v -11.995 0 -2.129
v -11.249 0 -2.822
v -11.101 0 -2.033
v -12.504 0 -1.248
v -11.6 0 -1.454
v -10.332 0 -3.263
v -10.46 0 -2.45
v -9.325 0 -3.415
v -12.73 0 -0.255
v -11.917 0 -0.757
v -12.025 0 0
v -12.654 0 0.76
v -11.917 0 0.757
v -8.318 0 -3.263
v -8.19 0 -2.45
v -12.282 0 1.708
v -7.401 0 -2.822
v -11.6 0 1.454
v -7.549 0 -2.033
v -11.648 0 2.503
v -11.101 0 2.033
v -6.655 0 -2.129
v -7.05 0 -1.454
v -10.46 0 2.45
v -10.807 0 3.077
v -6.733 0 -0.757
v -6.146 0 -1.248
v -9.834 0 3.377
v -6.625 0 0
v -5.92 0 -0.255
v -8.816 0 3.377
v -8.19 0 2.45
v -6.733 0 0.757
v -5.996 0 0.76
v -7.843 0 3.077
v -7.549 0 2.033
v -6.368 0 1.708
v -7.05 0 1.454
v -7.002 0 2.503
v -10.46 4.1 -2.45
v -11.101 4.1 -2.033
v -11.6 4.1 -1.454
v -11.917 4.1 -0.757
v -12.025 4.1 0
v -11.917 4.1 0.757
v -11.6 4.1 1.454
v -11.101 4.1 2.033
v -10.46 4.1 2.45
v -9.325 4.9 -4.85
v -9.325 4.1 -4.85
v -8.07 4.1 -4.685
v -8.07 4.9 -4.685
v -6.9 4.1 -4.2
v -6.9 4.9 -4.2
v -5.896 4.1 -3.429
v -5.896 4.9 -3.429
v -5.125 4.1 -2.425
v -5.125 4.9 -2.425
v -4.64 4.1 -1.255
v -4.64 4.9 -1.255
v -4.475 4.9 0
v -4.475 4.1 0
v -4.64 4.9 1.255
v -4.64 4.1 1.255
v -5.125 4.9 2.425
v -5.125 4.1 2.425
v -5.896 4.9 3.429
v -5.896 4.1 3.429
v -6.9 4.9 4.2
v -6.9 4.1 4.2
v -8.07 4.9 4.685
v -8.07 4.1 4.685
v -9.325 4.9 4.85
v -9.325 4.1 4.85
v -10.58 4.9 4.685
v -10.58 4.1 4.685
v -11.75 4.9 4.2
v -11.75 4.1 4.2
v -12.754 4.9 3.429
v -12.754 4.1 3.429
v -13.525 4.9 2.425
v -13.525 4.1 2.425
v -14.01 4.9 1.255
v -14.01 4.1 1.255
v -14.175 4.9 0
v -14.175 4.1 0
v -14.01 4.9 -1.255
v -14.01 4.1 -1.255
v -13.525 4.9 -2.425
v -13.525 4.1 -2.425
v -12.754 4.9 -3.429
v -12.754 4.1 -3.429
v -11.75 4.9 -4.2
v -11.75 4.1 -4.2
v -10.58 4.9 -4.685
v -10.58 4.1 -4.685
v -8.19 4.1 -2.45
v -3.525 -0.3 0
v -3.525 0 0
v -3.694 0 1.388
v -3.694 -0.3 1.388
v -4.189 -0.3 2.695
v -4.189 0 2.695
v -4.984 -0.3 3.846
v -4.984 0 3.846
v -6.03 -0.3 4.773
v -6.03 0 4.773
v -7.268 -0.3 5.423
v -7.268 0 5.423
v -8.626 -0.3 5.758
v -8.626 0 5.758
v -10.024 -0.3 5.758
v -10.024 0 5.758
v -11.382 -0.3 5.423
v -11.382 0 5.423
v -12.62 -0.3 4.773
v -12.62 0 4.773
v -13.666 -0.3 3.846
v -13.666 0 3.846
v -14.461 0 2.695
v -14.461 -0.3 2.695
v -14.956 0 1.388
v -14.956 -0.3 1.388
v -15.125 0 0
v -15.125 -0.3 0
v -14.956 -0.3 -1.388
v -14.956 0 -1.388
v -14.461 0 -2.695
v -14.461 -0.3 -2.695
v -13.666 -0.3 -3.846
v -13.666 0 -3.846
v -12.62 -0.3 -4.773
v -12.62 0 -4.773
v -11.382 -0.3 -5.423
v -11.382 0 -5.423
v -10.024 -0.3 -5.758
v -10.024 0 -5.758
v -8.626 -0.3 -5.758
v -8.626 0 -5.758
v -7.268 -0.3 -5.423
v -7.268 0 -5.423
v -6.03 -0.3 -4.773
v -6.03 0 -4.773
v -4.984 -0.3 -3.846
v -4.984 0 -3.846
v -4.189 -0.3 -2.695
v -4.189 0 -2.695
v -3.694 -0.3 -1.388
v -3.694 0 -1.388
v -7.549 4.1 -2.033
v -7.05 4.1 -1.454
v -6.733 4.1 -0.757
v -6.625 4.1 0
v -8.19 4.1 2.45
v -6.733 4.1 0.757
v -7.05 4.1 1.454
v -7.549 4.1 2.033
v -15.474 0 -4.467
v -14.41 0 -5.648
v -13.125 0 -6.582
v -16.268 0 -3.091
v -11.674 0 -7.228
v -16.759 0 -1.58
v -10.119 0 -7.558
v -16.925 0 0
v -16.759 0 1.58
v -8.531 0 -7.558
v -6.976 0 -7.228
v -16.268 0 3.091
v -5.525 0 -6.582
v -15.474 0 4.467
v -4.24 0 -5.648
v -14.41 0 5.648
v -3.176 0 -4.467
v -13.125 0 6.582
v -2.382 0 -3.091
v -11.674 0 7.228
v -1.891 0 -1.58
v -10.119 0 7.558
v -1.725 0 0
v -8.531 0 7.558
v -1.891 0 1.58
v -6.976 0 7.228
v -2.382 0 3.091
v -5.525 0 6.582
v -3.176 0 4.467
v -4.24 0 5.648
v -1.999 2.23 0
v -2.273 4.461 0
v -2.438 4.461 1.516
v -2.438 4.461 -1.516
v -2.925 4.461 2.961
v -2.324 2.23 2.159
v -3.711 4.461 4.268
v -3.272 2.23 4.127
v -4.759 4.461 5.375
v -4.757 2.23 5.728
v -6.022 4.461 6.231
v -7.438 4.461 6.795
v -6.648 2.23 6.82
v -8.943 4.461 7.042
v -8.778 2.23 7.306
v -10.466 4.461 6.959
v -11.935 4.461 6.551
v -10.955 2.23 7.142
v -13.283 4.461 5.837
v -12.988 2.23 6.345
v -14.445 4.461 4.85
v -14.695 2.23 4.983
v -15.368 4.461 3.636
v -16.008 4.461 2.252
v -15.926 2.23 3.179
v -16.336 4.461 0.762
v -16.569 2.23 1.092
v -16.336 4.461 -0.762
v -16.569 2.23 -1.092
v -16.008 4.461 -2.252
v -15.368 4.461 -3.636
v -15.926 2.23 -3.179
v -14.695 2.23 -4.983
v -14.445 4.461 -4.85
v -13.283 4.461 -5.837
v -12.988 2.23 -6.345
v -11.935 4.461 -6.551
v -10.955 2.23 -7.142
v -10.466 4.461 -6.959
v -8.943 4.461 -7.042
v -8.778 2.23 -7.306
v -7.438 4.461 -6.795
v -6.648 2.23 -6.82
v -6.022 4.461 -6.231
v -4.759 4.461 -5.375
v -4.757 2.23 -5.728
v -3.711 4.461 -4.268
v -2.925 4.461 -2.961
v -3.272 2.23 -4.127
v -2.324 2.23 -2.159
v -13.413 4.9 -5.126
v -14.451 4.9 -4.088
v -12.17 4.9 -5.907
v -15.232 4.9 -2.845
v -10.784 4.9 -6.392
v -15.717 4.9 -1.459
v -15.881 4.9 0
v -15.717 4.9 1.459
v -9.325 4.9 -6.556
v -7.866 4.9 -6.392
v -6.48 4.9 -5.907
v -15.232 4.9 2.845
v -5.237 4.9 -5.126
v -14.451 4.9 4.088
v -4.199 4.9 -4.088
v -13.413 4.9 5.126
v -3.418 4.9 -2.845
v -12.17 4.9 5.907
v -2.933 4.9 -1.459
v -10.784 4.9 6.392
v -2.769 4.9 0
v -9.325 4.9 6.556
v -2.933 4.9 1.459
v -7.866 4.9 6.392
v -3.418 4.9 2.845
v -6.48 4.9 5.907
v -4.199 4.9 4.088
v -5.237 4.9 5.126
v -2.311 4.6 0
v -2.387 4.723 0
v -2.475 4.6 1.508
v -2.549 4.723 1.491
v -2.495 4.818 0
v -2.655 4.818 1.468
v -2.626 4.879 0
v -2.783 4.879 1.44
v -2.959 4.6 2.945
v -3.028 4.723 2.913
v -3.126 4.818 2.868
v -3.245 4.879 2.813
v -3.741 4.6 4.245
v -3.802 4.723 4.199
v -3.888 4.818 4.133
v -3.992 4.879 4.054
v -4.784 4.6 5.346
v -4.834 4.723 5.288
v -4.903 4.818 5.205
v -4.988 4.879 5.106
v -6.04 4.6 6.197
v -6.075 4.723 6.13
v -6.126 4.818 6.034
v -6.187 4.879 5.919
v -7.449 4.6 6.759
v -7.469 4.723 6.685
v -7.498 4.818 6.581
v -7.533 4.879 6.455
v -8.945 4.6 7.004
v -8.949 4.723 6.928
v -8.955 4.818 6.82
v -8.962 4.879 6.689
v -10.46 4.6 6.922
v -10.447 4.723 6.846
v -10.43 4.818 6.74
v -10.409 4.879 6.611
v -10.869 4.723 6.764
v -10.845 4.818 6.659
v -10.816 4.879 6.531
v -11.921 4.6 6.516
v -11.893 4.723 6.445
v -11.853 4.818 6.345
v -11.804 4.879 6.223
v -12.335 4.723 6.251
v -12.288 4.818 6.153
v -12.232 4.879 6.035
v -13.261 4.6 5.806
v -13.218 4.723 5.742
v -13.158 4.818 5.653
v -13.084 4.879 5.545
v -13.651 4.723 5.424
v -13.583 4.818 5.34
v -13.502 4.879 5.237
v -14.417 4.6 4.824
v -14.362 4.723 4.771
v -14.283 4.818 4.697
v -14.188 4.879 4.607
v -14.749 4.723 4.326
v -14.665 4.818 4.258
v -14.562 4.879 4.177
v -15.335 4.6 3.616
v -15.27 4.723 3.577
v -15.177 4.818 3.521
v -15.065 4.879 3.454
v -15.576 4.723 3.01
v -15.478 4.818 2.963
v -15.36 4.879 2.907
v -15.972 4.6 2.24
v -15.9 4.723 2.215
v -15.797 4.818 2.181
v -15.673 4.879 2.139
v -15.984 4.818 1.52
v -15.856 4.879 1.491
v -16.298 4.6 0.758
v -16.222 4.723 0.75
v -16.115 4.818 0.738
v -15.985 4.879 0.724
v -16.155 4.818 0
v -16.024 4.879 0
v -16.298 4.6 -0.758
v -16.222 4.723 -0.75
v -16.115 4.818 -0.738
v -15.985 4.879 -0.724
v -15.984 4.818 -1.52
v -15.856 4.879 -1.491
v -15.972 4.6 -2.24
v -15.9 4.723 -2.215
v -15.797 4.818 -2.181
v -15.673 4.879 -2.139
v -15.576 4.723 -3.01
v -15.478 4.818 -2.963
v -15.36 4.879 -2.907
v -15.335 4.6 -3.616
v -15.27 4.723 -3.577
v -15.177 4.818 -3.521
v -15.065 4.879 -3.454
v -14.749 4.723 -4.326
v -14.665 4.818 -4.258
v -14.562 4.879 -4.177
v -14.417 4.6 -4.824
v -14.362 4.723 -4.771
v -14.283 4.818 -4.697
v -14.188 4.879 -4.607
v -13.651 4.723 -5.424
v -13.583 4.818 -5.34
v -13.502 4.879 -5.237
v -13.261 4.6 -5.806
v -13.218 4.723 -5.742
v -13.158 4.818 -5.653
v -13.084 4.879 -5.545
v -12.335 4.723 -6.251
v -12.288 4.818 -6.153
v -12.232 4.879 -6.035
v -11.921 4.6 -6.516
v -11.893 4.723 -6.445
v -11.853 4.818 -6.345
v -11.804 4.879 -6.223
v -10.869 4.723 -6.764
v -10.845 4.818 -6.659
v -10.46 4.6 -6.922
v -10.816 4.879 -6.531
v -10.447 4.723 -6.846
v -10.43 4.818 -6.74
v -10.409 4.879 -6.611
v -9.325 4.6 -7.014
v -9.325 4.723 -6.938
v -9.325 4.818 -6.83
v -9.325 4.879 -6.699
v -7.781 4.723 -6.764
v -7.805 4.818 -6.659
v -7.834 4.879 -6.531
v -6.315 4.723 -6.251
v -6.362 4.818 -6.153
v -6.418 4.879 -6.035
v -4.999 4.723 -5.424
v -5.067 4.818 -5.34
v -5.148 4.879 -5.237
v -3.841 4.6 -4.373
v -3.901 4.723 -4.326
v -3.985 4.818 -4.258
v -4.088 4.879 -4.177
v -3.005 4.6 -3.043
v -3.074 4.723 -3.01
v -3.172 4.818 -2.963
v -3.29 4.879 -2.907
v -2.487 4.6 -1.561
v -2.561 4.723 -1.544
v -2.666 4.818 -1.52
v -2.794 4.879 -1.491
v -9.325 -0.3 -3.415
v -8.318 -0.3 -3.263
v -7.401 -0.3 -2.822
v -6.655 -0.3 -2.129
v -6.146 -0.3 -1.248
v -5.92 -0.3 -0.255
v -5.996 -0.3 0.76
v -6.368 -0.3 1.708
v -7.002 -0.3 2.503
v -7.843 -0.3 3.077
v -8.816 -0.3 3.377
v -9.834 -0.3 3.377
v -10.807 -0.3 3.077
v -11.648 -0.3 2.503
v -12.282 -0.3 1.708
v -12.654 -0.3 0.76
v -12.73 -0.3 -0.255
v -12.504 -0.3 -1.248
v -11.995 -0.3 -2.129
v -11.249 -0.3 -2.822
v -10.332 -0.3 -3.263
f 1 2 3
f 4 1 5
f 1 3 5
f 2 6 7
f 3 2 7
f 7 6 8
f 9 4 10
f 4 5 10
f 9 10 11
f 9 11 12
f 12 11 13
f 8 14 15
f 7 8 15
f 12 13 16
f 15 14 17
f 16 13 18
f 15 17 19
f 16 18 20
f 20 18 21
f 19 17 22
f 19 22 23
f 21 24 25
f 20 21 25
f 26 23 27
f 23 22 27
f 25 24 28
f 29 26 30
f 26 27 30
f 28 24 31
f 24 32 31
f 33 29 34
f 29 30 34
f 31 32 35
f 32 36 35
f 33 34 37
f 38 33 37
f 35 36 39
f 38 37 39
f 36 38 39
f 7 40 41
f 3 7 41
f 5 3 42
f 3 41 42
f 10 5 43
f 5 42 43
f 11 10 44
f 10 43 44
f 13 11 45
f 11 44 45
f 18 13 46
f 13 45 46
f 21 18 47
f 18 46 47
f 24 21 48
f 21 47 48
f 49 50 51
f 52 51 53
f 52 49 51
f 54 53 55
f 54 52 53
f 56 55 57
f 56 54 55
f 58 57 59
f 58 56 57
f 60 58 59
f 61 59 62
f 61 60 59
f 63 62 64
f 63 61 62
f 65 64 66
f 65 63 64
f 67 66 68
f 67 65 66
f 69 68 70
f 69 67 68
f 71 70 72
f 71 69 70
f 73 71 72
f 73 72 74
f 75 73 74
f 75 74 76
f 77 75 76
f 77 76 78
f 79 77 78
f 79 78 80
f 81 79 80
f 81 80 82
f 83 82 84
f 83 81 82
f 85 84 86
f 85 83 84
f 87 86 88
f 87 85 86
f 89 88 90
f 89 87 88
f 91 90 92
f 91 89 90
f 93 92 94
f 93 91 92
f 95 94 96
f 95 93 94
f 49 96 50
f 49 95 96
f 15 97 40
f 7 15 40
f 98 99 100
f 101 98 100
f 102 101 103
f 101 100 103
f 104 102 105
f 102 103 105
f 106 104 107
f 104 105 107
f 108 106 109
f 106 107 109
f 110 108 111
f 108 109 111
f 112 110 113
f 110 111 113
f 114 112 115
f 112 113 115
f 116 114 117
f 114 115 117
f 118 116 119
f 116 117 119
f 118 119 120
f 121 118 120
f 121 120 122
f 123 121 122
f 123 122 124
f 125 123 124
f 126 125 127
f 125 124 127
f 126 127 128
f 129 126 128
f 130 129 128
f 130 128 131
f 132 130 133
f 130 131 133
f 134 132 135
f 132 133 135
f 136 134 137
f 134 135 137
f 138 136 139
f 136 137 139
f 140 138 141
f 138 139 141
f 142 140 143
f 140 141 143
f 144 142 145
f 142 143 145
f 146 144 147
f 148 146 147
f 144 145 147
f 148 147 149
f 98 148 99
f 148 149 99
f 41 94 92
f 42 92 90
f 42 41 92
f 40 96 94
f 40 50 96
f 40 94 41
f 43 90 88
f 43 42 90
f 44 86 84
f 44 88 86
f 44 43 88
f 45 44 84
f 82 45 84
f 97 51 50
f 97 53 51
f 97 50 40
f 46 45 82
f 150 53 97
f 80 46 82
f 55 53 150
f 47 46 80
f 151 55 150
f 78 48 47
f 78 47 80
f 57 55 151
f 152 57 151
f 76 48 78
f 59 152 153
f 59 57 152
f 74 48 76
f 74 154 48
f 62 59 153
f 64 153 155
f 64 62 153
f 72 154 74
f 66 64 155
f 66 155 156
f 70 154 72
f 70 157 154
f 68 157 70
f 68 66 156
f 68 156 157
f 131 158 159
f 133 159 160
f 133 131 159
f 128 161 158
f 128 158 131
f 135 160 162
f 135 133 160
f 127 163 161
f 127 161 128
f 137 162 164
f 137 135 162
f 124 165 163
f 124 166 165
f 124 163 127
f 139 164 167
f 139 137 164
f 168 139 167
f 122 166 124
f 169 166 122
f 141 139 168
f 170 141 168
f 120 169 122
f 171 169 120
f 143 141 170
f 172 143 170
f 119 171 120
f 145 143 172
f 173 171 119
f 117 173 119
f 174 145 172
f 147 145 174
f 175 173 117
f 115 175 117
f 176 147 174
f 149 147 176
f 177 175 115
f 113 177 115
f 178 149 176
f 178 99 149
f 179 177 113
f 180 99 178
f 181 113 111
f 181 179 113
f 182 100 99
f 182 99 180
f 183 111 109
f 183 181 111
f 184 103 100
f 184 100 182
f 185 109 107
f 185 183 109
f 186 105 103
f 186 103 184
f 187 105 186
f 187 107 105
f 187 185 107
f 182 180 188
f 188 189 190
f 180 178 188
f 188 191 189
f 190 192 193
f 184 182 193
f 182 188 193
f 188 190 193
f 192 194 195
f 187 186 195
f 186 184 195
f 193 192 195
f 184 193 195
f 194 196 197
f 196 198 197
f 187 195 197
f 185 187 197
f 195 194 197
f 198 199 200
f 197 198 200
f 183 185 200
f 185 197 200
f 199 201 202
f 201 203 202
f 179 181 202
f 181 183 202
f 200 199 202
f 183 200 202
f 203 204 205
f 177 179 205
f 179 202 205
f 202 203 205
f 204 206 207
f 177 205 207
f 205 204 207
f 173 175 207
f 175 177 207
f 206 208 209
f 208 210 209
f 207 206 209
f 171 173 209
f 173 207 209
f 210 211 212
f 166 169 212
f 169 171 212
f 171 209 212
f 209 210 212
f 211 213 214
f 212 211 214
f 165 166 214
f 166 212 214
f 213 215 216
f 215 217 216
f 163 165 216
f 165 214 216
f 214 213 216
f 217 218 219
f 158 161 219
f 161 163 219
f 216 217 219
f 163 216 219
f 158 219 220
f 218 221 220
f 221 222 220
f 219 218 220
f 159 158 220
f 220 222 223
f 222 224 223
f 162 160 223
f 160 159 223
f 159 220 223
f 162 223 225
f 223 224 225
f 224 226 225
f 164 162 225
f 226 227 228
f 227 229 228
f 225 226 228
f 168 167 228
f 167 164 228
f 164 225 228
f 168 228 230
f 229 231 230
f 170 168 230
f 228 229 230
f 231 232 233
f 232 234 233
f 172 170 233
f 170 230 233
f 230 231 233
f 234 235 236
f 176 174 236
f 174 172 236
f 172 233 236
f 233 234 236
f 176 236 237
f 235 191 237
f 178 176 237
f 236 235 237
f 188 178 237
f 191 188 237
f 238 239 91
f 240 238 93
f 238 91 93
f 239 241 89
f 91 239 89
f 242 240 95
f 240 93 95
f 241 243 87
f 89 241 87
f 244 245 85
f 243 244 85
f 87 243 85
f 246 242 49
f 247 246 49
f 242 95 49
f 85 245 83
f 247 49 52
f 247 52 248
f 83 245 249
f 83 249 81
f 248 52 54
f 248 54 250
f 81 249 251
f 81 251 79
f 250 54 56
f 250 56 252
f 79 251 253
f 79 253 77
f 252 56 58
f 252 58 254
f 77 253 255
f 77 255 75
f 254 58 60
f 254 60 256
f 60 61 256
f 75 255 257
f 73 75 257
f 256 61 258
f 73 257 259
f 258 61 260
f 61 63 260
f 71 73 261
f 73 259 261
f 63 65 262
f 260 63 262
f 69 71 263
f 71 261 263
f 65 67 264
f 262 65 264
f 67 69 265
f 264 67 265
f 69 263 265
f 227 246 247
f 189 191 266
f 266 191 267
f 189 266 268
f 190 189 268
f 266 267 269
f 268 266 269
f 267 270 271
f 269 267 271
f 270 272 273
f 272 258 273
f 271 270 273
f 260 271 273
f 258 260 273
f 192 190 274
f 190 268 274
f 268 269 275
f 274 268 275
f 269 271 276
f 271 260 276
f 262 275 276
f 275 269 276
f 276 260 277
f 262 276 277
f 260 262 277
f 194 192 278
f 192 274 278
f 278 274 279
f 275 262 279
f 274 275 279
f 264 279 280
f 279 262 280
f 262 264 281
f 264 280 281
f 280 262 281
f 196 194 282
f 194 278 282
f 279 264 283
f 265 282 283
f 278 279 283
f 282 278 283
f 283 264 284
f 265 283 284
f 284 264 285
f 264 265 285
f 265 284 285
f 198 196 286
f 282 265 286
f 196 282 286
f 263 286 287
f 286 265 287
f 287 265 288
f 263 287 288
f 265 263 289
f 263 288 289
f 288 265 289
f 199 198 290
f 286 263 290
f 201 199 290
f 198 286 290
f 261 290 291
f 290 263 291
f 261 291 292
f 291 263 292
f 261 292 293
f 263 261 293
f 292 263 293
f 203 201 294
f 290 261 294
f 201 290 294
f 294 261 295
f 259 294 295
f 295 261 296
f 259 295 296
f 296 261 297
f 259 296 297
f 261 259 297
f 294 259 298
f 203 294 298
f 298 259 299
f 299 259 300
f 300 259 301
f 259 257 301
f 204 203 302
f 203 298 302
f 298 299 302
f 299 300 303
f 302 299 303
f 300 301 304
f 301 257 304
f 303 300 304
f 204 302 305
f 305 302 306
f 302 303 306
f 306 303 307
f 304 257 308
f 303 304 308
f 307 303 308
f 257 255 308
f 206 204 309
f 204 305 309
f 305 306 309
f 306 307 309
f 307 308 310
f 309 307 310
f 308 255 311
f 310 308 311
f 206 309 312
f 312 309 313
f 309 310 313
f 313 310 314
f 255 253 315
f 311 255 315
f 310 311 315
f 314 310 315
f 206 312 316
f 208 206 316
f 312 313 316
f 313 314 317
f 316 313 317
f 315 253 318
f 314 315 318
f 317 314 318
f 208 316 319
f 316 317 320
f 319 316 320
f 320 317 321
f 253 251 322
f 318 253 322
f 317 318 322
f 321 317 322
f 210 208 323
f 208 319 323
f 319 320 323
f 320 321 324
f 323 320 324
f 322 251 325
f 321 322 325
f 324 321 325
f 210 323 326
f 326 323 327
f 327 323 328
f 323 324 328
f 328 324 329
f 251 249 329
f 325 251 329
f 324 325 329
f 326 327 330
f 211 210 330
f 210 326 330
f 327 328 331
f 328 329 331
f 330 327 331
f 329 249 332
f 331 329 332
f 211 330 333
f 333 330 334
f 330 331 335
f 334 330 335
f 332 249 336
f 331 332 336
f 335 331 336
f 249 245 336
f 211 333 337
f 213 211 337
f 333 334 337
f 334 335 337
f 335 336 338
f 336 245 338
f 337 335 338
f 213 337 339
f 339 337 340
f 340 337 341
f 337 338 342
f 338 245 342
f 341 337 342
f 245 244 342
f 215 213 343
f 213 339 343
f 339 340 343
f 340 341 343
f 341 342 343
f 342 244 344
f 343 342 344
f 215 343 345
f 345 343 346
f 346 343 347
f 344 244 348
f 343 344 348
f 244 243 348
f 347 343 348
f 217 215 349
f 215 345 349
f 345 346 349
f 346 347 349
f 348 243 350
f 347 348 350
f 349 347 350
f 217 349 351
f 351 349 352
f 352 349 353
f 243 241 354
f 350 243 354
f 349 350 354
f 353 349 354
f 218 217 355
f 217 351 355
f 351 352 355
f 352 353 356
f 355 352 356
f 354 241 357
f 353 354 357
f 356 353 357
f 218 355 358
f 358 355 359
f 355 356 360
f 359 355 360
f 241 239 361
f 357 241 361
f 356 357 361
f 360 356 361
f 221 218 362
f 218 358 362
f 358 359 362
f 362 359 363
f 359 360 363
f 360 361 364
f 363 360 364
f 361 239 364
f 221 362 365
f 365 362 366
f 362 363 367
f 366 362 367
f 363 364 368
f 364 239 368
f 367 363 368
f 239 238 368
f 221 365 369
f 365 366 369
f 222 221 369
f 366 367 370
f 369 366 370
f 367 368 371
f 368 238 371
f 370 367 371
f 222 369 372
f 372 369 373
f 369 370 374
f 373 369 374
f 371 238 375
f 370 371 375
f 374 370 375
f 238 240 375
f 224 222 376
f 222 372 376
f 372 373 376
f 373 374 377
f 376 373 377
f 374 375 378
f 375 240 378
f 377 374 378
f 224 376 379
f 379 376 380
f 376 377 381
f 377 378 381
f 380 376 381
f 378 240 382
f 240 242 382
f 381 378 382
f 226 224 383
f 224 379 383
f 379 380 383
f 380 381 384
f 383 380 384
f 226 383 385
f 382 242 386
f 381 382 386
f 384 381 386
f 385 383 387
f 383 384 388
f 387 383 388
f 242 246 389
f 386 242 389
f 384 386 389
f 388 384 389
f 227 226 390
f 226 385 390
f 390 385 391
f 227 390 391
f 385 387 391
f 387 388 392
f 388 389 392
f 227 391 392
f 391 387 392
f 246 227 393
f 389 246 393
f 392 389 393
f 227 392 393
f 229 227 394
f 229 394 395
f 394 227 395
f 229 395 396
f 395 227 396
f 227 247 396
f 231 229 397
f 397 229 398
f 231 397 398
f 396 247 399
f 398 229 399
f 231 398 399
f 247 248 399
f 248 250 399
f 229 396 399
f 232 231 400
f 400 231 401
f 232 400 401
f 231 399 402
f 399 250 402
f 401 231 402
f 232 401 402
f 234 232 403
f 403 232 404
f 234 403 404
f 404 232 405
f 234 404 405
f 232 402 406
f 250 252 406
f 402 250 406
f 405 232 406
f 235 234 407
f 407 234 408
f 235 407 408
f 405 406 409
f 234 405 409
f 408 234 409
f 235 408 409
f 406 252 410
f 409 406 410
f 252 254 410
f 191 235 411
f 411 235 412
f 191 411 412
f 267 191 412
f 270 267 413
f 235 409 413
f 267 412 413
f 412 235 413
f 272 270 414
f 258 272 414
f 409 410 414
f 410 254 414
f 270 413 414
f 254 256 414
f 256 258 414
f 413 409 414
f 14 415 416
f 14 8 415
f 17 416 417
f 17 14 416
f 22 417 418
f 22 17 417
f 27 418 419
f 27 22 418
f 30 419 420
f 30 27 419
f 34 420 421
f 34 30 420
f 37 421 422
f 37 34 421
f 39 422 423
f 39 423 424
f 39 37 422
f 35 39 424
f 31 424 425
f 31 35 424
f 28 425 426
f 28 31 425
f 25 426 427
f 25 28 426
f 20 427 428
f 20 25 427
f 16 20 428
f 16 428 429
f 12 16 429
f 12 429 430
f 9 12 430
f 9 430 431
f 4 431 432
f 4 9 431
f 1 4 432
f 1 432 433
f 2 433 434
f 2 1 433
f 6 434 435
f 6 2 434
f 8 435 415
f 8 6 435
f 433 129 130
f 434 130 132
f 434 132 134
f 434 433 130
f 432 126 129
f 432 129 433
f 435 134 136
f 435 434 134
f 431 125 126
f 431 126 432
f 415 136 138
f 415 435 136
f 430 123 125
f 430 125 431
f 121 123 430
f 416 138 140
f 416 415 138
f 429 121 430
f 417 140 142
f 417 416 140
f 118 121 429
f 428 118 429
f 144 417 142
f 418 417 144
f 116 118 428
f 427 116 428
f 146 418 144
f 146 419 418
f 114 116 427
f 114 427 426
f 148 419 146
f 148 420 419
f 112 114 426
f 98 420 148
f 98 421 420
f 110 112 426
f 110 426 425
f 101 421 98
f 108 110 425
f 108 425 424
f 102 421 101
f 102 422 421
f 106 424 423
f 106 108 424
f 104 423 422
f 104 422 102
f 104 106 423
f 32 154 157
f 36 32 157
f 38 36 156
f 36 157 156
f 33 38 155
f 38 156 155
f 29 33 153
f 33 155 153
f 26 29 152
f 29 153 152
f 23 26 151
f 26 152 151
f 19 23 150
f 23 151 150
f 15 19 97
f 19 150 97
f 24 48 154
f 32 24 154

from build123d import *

# Parameters (mm, degrees)
SALIENTE_EXTRUIR1_DEPTH    = 4.9
SALIENTE_EXTRUIR1_TAPER    = 7
CROQUIS2_R                 = 5.8
SALIENTE_EXTRUIR2_DEPTH    = 0.3
CORTAR_EXTRUIR1_DEPTH      = 6.2
CROQUIS4_R                 = 5.8
SALIENTE_EXTRUIR3_DEPTH    = 0.3
CORTAR_EXTRUIR2_DEPTH      = 6.2
CORTAR_EXTRUIR3_DEPTH      = 3.75
CROQUIS7_W                 = 4.85
CROQUIS7_H                 = 0.9
CROQUIS8_W                 = 4.85
CROQUIS8_H                 = 0.9
CROQUIS9_W                 = 3.415
CROQUIS9_H                 = 0.3
CROQUIS10_W                = 3.415
CROQUIS10_H                = 0.3
CROQUIS11_OUTSIDE_W        = 43.344
CROQUIS11_OUTSIDE_H        = 24.694
CROQUIS11_OUTSIDE_R        = 6.99
CORTAR_EXTRUIR8_DEPTH      = 5.9000001
CORTAR_EXTRUIR8_DEPTH_BACK = 1.3
CROQUIS20_R                = 7.6
CROQUIS20_R_2              = 5.8
SALIENTE_EXTRUIR11_DEPTH   = 4.9
SALIENTE_EXTRUIR11_TAPER   = 7
REDONDEO6_R                = 0.5


with BuildPart() as part:
    # Croquis1 → Saliente-Extruir1 (new body)
    with BuildSketch(Plane.XZ):
        with BuildLine():
            Line((-9.325, -7.6), (9.325, -7.6))
            ThreePointArc((9.325, -7.6), (16.925, 0), (9.325, 7.6))
            Line((9.325, 7.6), (-9.325, 7.6))
            ThreePointArc((-9.325, 7.6), (-16.925, 0), (-9.325, -7.6))
        make_face()
    extrude(amount=-SALIENTE_EXTRUIR1_DEPTH, taper=SALIENTE_EXTRUIR1_TAPER)

    # Croquis2 → Saliente-Extruir2 (add)
    with BuildSketch(Plane.XZ):
        with Locations((9.325, 0)):
            Circle(CROQUIS2_R)
    extrude(amount=SALIENTE_EXTRUIR2_DEPTH)

    # Croquis3 → Cortar-Extruir1 (cut, through all)
    with BuildSketch(Plane(origin=(0, 4.9, 0), x_dir=(-1, 0, 0), z_dir=(0, 1, 0))):
        with BuildLine():
            Line((-10.459680572, -2.45), (-8.190319428, -2.45))
            ThreePointArc((-8.190319428, -2.45), (-6.625, 0), (-8.190319428, 2.45))
            Line((-8.190319428, 2.45), (-10.459680572, 2.45))
            ThreePointArc((-10.459680572, 2.45), (-12.025, 0), (-10.459680572, -2.45))
        make_face()
    extrude(amount=-CORTAR_EXTRUIR1_DEPTH, mode=Mode.SUBTRACT)

    # Croquis4 → Saliente-Extruir3 (add)
    with BuildSketch(Plane.XZ):
        with Locations((-9.325, 0)):
            Circle(CROQUIS4_R)
    extrude(amount=SALIENTE_EXTRUIR3_DEPTH)

    # Croquis5 → Cortar-Extruir2 (cut, through all)
    with BuildSketch(Plane(origin=(0, 4.9, 0), x_dir=(-1, 0, 0), z_dir=(0, 1, 0))):
        with BuildLine():
            Line((10.459680572, 2.45), (8.190319428, 2.45))
            ThreePointArc((8.190319428, 2.45), (6.625, 0), (8.190319428, -2.45))
            Line((8.190319428, -2.45), (10.459680572, -2.45))
            ThreePointArc((10.459680572, -2.45), (12.025, 0), (10.459680572, 2.45))
        make_face()
    extrude(amount=-CORTAR_EXTRUIR2_DEPTH, mode=Mode.SUBTRACT)

    # Croquis6 → Cortar-Extruir3 (cut)
    with BuildSketch(Plane.XZ):
        with BuildLine():
            Line((-2.15, 2.8), (-2.15, -2.8))
            ThreePointArc((-2.15, -2.8), (0, -4.95), (2.15, -2.8))
            Line((2.15, -2.8), (2.15, 2.8))
            ThreePointArc((2.15, 2.8), (0, 4.95), (-2.15, 2.8))
        make_face()
    extrude(amount=-CORTAR_EXTRUIR3_DEPTH, mode=Mode.SUBTRACT)

    # Croquis7 → Cortar-Revolución1 (revolve, cut)
    with BuildSketch(Plane(origin=(-9.325, 0, 0), x_dir=(0, 0, -1), z_dir=(1, 0, 0))):
        with Locations((2.425, 4.55)):
            Rectangle(CROQUIS7_W, CROQUIS7_H)
    revolve(axis=Axis((-9.325, 5, 0), (0, -1, 0)), mode=Mode.SUBTRACT)

    # Croquis8 → Cortar-Revolución2 (revolve, cut)
    with BuildSketch(Plane(origin=(9.325, 0, 0), x_dir=(0, 0, -1), z_dir=(1, 0, 0))):
        with Locations((2.425, 4.55)):
            Rectangle(CROQUIS8_W, CROQUIS8_H)
    revolve(axis=Axis((9.325, 5, 0), (0, -1, 0)), mode=Mode.SUBTRACT)

    # Croquis9 → Cortar-Revolución3 (revolve, cut)
    with BuildSketch(Plane(origin=(-9.325, 0, 0), x_dir=(0, 0, -1), z_dir=(1, 0, 0))):
        with Locations((1.7075, -0.15)):
            Rectangle(CROQUIS9_W, CROQUIS9_H)
    revolve(axis=Axis((-9.325, 0, 0), (0, -1, 0)), mode=Mode.SUBTRACT)

    # Croquis10 → Cortar-Revolución4 (revolve, cut)
    with BuildSketch(Plane(origin=(9.325, 0, 0), x_dir=(0, 0, -1), z_dir=(1, 0, 0))):
        with Locations((1.7075, -0.15)):
            Rectangle(CROQUIS10_W, CROQUIS10_H)
    revolve(axis=Axis((9.325, 0, 0), (0, -1, 0)), mode=Mode.SUBTRACT)

    # Croquis11 outside → Cortar-Extruir8 (cut, two sides)
    with BuildSketch(Plane(origin=(0, 0, 0), x_dir=(1, 0, 0), z_dir=(0, 1, 0))) as cortar_extruir8_sk:
        Rectangle(CROQUIS11_OUTSIDE_W, CROQUIS11_OUTSIDE_H)
        with Locations((-9.325, 0)):
            Circle(CROQUIS11_OUTSIDE_R, mode=Mode.SUBTRACT)
    extrude(amount=CORTAR_EXTRUIR8_DEPTH, mode=Mode.SUBTRACT)
    extrude(cortar_extruir8_sk.sketch, amount=-CORTAR_EXTRUIR8_DEPTH_BACK, mode=Mode.SUBTRACT)

    # Croquis20 → Saliente-Extruir11 (add)
    with BuildSketch(Plane.XZ):
        with Locations((-9.325, 0)):
            Circle(CROQUIS20_R)
        with Locations((-9.325, 0)):
            Circle(CROQUIS20_R_2, mode=Mode.SUBTRACT)
    extrude(amount=-SALIENTE_EXTRUIR11_DEPTH, taper=SALIENTE_EXTRUIR11_TAPER)

    # Redondeo6
    redondeo6_edges = [part.edges().sort_by_distance(p)[0] for p in [
        (-16.323355652, 4.9, 0),
    ]]
    fillet(redondeo6_edges, radius=REDONDEO6_R)


solid = part.part
